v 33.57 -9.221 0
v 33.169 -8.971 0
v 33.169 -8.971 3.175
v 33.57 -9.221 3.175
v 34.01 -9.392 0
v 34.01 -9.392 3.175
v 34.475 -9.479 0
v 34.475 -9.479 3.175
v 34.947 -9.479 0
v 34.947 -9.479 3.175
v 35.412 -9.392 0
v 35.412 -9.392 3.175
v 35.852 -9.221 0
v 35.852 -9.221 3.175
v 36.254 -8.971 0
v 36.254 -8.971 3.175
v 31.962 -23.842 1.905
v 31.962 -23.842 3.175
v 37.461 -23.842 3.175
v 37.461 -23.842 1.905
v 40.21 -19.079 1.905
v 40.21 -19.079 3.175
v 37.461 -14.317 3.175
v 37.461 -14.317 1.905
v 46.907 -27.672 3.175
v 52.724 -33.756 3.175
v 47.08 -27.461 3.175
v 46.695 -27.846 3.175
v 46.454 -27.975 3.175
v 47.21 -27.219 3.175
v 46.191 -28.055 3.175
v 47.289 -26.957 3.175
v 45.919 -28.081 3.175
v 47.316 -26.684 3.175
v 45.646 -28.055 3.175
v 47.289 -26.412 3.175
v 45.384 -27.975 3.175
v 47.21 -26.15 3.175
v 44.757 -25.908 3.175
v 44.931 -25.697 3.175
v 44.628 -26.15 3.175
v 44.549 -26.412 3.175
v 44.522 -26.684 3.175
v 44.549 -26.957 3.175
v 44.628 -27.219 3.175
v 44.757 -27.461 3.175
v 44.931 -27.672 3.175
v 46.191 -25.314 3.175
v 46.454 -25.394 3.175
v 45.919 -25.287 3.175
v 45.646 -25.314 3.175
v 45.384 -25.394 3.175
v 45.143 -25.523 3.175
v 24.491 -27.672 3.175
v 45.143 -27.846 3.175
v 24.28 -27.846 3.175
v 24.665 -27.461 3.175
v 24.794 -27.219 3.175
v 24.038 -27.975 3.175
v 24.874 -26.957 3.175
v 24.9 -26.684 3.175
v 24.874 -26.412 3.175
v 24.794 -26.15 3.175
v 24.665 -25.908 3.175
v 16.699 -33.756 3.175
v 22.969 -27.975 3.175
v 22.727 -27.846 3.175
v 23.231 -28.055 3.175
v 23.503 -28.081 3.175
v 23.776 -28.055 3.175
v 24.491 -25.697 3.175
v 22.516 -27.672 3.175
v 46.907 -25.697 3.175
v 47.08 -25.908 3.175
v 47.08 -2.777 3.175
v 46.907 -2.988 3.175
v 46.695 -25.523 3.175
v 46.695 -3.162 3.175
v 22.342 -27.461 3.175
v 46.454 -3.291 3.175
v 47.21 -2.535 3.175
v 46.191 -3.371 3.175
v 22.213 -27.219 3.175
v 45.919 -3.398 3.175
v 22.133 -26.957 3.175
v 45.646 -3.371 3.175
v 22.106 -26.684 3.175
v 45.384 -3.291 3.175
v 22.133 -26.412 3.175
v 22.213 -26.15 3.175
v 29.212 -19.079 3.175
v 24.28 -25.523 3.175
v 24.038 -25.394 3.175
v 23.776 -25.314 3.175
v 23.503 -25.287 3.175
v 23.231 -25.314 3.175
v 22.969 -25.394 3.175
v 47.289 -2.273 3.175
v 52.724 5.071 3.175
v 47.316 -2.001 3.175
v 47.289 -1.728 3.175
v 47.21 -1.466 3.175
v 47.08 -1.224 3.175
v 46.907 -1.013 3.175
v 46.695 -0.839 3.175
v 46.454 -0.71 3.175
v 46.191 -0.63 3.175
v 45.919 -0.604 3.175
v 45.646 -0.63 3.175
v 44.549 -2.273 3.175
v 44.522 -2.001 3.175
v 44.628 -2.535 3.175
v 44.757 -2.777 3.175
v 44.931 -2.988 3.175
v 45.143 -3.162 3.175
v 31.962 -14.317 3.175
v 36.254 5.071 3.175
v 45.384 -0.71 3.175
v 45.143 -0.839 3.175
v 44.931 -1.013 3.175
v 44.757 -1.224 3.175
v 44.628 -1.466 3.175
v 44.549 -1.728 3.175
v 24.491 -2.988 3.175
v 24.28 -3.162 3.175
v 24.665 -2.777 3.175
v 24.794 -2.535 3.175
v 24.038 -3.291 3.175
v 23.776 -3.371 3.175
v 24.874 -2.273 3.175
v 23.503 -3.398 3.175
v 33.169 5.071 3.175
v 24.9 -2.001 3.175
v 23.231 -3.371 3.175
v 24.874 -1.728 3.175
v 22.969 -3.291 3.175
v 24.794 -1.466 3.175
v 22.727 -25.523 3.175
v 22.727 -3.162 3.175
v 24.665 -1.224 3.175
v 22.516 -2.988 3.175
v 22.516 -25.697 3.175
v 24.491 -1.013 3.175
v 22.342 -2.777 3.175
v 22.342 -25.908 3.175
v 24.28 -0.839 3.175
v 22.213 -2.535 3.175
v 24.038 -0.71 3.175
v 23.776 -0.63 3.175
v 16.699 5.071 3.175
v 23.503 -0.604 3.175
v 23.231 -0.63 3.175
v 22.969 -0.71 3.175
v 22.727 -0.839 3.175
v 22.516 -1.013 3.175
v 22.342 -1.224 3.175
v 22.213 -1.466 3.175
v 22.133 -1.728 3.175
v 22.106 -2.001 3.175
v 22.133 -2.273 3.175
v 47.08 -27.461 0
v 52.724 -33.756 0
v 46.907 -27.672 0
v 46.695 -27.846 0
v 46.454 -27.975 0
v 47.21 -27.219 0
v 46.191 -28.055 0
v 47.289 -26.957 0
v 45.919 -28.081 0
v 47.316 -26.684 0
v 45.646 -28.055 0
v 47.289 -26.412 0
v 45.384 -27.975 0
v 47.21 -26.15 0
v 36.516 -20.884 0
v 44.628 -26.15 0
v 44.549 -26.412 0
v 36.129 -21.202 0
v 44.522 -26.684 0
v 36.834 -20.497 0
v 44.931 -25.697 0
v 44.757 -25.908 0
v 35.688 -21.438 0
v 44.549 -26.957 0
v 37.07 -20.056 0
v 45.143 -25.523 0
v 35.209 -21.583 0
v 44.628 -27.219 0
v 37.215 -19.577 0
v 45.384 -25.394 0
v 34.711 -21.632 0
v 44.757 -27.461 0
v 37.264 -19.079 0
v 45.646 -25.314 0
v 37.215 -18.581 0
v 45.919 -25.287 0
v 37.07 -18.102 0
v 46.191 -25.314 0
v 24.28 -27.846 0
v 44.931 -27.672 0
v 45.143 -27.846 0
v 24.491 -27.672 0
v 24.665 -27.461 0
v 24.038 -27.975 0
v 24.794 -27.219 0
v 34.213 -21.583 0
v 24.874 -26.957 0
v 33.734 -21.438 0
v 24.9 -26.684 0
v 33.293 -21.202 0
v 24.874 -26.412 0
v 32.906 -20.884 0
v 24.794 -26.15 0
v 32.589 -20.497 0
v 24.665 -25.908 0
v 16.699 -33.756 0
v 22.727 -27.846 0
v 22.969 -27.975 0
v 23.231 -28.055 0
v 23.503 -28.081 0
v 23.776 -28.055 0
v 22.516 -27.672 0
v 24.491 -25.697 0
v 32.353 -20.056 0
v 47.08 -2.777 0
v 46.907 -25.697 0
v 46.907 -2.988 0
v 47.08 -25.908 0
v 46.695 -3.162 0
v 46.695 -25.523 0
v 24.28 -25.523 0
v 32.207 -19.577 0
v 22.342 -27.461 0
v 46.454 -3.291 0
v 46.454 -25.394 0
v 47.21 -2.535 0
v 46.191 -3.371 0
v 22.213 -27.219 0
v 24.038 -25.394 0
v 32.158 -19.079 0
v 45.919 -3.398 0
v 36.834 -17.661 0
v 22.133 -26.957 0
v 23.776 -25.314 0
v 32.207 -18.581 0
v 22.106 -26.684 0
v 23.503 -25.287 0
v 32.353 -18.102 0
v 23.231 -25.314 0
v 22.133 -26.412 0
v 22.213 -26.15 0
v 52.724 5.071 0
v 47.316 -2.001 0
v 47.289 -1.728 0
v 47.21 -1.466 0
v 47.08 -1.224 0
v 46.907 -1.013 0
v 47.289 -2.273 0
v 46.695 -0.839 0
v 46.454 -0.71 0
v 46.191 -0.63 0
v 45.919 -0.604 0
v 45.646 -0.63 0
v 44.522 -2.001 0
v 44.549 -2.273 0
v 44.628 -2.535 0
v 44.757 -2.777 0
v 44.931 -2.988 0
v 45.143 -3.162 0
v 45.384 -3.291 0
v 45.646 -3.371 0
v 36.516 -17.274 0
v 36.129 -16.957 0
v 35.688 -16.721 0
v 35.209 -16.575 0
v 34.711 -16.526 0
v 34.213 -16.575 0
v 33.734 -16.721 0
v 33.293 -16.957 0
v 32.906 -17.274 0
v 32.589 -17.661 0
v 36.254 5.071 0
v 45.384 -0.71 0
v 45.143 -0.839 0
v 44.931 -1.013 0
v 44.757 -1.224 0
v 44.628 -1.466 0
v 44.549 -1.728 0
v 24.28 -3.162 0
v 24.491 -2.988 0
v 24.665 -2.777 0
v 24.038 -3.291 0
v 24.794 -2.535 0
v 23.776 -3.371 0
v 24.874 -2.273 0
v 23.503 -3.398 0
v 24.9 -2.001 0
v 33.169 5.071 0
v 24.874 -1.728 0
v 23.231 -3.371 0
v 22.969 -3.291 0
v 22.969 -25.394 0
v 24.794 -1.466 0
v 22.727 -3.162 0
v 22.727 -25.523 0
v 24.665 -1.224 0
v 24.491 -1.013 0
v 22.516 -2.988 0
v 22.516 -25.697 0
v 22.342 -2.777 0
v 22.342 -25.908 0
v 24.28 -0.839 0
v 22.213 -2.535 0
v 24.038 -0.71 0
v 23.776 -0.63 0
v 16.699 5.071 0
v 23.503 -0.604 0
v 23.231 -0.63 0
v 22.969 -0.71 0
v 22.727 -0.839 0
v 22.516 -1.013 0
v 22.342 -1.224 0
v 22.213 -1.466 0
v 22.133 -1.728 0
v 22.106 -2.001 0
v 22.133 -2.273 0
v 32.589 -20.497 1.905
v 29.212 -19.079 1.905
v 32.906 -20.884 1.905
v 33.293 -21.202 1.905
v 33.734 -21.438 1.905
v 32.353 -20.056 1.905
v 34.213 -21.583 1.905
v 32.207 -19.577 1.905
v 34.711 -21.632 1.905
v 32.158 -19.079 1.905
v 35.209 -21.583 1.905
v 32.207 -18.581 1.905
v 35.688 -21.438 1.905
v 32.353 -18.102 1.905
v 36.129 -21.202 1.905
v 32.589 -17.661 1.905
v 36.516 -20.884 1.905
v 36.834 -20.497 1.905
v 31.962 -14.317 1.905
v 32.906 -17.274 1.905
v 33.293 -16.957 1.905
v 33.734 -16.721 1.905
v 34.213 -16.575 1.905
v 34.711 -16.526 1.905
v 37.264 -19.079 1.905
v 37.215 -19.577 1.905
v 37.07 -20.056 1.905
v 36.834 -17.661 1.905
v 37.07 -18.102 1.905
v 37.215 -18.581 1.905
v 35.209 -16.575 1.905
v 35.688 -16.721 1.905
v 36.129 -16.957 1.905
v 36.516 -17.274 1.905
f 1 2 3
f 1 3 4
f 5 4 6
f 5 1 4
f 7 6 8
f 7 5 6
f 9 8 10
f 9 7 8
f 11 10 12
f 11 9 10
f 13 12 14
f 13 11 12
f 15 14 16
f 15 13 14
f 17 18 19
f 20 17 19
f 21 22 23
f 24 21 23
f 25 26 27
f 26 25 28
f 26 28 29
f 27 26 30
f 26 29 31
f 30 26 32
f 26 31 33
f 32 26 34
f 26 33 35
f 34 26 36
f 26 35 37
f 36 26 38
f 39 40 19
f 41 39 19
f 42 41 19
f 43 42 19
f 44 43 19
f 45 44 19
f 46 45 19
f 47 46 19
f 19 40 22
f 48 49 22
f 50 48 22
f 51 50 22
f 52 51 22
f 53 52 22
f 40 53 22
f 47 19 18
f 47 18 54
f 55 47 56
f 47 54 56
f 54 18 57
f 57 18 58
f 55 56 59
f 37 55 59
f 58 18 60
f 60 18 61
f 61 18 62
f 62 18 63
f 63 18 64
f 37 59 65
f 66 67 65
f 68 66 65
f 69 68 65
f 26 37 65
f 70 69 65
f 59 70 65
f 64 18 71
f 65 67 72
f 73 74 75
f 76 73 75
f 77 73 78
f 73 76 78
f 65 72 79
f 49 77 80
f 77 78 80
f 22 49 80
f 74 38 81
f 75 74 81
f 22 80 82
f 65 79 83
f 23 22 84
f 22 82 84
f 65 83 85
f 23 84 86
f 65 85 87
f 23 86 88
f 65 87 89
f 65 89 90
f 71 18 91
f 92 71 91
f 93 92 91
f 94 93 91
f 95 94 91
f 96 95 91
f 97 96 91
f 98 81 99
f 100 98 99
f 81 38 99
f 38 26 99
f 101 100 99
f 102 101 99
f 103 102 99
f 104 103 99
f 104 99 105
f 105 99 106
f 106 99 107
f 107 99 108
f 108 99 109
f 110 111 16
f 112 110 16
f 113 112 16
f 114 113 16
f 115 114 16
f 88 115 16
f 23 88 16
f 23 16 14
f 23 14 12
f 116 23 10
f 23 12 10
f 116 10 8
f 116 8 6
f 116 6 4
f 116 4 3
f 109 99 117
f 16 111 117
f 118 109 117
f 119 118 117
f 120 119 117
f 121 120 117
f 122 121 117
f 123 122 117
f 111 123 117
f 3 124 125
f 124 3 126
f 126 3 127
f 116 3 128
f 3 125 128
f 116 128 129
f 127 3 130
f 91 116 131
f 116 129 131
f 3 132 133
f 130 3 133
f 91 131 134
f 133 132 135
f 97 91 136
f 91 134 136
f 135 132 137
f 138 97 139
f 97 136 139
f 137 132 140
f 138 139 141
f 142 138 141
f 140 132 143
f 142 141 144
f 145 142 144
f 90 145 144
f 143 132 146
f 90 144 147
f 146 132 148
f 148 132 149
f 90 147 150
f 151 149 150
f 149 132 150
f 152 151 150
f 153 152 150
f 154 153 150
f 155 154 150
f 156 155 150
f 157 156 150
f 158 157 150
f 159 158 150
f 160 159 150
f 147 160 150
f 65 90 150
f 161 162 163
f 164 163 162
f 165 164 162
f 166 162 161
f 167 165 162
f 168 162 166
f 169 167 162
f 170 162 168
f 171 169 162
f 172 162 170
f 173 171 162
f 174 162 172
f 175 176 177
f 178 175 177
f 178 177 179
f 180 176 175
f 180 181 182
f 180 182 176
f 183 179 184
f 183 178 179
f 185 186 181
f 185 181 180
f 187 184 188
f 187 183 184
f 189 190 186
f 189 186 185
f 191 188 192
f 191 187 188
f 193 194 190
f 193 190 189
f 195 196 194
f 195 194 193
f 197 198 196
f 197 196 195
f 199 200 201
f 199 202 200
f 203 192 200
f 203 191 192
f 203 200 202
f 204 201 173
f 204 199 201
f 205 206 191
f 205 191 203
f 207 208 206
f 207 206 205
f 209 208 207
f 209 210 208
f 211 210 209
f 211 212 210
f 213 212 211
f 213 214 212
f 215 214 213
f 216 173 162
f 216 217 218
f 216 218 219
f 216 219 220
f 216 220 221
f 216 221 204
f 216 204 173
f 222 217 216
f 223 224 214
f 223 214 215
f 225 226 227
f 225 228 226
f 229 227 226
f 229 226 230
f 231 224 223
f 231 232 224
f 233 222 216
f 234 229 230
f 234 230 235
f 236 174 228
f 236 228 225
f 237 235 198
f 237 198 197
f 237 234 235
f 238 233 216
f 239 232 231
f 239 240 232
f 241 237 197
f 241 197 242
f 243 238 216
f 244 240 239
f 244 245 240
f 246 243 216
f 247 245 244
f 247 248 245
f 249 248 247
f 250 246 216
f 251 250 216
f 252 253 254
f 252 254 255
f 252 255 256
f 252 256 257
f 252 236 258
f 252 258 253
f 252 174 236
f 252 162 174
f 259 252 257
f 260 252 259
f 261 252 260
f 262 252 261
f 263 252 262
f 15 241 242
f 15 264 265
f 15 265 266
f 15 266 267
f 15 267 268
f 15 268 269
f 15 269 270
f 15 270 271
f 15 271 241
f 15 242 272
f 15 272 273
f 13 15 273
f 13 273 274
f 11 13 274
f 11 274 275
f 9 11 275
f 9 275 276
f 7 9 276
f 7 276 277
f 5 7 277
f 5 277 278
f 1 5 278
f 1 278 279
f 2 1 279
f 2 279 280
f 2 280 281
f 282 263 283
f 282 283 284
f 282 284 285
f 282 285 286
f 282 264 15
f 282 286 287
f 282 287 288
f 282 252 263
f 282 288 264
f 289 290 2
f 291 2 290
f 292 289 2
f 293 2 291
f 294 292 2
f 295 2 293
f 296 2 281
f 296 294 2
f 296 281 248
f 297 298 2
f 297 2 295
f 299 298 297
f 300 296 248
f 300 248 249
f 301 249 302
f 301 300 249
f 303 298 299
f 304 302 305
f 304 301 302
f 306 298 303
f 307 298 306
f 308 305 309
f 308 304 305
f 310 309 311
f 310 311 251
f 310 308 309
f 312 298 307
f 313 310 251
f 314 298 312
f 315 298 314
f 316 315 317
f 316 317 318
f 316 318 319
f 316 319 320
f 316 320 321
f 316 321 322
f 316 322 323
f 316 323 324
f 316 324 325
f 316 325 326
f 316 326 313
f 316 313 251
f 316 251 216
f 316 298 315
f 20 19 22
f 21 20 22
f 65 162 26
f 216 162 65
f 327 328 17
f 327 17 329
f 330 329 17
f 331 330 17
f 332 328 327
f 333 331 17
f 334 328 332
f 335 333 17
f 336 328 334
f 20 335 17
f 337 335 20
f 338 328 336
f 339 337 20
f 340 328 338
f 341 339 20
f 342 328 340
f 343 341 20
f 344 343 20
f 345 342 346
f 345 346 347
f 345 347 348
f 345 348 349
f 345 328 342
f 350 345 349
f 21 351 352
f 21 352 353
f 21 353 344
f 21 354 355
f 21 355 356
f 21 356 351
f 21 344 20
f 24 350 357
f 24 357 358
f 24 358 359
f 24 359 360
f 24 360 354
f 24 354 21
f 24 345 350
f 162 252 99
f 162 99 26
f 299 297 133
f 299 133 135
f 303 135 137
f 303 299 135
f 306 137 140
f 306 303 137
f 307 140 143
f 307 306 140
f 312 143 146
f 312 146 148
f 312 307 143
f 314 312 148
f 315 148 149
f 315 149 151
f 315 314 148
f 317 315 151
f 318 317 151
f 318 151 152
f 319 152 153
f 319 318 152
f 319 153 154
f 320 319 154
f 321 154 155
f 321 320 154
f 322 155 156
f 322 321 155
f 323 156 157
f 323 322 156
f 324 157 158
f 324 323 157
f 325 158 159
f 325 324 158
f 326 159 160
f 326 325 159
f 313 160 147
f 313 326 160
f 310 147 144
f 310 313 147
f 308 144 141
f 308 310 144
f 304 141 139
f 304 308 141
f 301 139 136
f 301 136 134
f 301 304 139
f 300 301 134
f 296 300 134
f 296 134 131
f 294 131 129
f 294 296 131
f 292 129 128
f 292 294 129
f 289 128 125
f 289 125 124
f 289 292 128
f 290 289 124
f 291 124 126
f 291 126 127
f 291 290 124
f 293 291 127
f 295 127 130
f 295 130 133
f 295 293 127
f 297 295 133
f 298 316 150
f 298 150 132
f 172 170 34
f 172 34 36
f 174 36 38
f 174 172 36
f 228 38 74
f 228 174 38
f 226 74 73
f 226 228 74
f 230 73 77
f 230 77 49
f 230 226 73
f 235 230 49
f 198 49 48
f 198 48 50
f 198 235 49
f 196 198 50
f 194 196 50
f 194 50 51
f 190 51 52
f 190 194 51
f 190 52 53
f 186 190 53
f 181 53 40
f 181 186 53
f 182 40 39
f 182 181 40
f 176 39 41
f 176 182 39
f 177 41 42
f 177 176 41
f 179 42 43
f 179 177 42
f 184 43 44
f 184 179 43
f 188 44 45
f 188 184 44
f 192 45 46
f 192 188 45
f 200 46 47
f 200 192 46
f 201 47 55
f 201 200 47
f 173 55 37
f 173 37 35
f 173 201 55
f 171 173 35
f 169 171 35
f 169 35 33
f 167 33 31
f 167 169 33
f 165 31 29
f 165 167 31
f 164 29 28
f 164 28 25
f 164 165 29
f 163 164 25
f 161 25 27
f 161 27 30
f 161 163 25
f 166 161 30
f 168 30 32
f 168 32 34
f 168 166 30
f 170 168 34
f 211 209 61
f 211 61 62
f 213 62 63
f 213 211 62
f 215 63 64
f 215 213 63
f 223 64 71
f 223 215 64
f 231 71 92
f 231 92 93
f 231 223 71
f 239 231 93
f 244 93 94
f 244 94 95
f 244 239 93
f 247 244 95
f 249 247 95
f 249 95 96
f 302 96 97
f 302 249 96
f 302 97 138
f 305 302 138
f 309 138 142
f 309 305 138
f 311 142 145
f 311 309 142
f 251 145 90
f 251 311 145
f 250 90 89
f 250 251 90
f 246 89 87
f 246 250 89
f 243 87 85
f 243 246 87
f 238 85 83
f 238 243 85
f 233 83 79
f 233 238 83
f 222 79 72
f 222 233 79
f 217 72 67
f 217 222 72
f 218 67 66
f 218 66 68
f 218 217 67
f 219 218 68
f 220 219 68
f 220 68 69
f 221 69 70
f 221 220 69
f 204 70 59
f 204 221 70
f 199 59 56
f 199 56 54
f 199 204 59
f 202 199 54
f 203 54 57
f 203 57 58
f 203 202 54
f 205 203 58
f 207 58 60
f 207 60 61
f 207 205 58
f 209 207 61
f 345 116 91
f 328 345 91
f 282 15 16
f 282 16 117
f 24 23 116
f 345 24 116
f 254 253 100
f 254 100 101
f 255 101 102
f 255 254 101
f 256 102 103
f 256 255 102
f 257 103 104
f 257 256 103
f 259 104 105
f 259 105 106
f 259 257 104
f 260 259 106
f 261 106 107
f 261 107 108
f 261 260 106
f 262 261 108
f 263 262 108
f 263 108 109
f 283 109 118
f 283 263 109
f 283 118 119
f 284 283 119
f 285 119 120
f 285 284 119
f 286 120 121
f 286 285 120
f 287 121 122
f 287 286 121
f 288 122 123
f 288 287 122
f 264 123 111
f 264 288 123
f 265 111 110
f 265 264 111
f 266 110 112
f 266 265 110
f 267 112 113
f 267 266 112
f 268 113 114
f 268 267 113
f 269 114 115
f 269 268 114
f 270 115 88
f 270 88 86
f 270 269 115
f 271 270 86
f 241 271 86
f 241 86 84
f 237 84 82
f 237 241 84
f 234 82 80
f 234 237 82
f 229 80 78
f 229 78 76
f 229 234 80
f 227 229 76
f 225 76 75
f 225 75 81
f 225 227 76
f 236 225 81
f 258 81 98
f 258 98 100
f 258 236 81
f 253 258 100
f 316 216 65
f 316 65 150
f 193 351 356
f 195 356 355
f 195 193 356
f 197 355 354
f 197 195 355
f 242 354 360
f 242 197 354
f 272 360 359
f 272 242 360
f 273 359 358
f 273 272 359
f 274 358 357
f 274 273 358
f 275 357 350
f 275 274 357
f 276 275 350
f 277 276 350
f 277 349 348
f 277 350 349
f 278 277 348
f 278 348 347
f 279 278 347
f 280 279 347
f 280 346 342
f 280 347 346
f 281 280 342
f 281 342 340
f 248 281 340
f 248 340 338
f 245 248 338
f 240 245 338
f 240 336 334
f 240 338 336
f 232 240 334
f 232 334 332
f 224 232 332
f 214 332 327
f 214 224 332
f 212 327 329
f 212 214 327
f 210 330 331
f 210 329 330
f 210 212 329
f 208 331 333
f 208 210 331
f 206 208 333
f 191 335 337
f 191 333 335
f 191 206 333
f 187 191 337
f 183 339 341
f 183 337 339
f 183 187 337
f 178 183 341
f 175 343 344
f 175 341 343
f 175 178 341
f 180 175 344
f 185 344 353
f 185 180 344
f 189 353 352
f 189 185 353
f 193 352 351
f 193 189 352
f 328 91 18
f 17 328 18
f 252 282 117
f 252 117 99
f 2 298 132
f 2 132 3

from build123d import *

# Parameters (mm, degrees)
SKETCH1_R           = 2.5527
SKETCH1_R_2         = 1.397
BOSS_EXTRUDE1_DEPTH = 3.175
CUT_EXTRUDE1_DEPTH  = 1.27


with BuildPart() as part:
    # Sketch1 → Boss-Extrude1 (new body)
    with BuildSketch(Plane.XY):
        with BuildLine():
            Line((16.698666352, 5.070945327), (33.168661373, 5.070945327))
            Line((33.168661373, 5.070945327), (33.168661373, -4.903410628))
            Line((33.168661373, -4.903410628), (33.168661373, -8.971340476))
            ThreePointArc((33.168661373, -8.971340476), (34.711147671, -9.490075552), (36.253633968, -8.971340476))
            Line((36.253633968, -8.971340476), (36.253633968, -4.903410628))
            Line((36.253633968, -4.903410628), (36.253633968, 5.070945327))
            Line((36.253633968, 5.070945327), (52.72362899, 5.070945327))
            Line((52.72362899, 5.070945327), (52.72362899, -33.755958849))
            Line((52.72362899, -33.755958849), (16.698666352, -33.755958849))
            Line((16.698666352, -33.755958849), (16.698666352, 5.070945327))
        make_face()
        with Locations((34.711147671, -19.07912216)):
            Circle(SKETCH1_R, mode=Mode.SUBTRACT)
        with Locations((45.918913825, -2.000621413)):
            Circle(SKETCH1_R_2, mode=Mode.SUBTRACT)
        with Locations((23.503381517, -2.000621413)):
            Circle(SKETCH1_R_2, mode=Mode.SUBTRACT)
        with Locations((23.503381517, -26.684392109)):
            Circle(SKETCH1_R_2, mode=Mode.SUBTRACT)
        with Locations((45.918913825, -26.684392109)):
            Circle(SKETCH1_R_2, mode=Mode.SUBTRACT)
    extrude(amount=BOSS_EXTRUDE1_DEPTH)

    # Sketch3 → Cut-Extrude1 (cut)
    with BuildSketch(Plane.XY.offset(3.175)):
        Polygon((40.210408985, -19.07912216), (37.460778328, -14.31662216), (31.961517014, -14.31662216), (29.211886357, -19.07912216), (31.961517014, -23.84162216), (37.460778328, -23.84162216), align=None)
    extrude(amount=-CUT_EXTRUDE1_DEPTH, mode=Mode.SUBTRACT)


solid = part.part
